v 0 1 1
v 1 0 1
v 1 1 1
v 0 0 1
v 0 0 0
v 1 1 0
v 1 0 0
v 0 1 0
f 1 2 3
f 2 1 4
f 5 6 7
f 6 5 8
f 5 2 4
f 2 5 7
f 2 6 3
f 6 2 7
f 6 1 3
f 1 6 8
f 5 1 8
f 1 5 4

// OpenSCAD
// file: ../config.scad
// Global configuration for the printable 28BYJ-48 Alt-Az mount.
// Units: millimetres, degrees.

$fn = $preview ? 48 : 96;
EPS = 0.02;

FIT = 0.25;
PRESS_FIT = 0.10;
ELEPHANT_FOOT = 0.25;
MIN_WALL = 2.4;

// 28BYJ-48 mechanical envelope. Clone dimensions vary: verify yours.
BYJ_BODY_D = 28.0;
BYJ_BODY_H = 19.0;
BYJ_FLANGE_T = 1.5;
BYJ_BOSS_D = 9.0;
BYJ_BOSS_H = 2.5;
BYJ_SHAFT_D = 5.0;
BYJ_SHAFT_FLAT = 3.0;
BYJ_SHAFT_L = 10.0;
BYJ_MOUNT_SPACING = 35.0;
BYJ_MOUNT_HOLE_D = 4.0;
BYJ_SHAFT_TO_HOLE_LINE = 8.0;
BYJ_BODY_CENTER_FROM_SHAFT = [0, -11.0];
BYJ_CABLE_BOX = [14.6, 8.0, 11.0];

// Additional reducer: 12 -> 48 and 12 -> 60 = 20:1.
GEAR_MODULE = 1.0;
GEAR_PRESSURE_ANGLE = 20;
GEAR_BACKLASH = 0.12;
GEAR_CLEARANCE = 0.25;
GEAR_Z1 = 12;
GEAR_Z2 = 48;
GEAR_Z3 = 12;
GEAR_Z4 = 60;
GEAR_FACE = 5.0;
GEAR_GAP = 1.0;
GEAR_STACK_H = GEAR_FACE * 2 + GEAR_GAP;
GEAR_RATIO = (GEAR_Z2 / GEAR_Z1) * (GEAR_Z4 / GEAR_Z3);
CD_STAGE1 = GEAR_MODULE * (GEAR_Z1 + GEAR_Z2) / 2;
CD_STAGE2 = GEAR_MODULE * (GEAR_Z3 + GEAR_Z4) / 2;

REDUCER_OUTPUT = [0, 0];
REDUCER_INTERMEDIATE = [CD_STAGE2, 0];
REDUCER_MOTOR = [CD_STAGE2, CD_STAGE1];
REDUCER_MOTOR_ROT = 130;
INTERMEDIATE_AXLE_D = 3.2;

BEARING_608_ID = 8.0;
BEARING_608_OD = 22.0;
BEARING_608_W = 7.0;
AXIS_SHAFT_D = 8.0;
AXIS_CLEARANCE_D = 8.3;
M3_CLEARANCE_D = 3.3;
M4_CLEARANCE_D = 4.4;
M5_CLEARANCE_D = 5.5;
M8_CLEARANCE_D = 8.6;

TRIPOD_THREAD_D = 6.35;
TRIPOD_CLEARANCE_D = 6.8;
TRIPOD_NUT_AF = 11.2;
TRIPOD_NUT_H = 5.8;

// Azimuth base, gearbox cover and turntable.
AZ_BASE_D = 132.0;
AZ_COVER_BOLT_R = 59.0;
AZ_BASE_PLATE_H = 3.0;
AZ_PEDESTAL_H = 24.0;
AZ_PEDESTAL_D = 48.0;
AZ_COVER_H = 16.0;
AZ_COVER_WALL = 3.0;
AZ_COVER_TOP_T = 3.0;
AZ_TURNTABLE_D = 120.0;
AZ_TURNTABLE_H = 9.0;
AZ_GLIDE_RADIUS = 43.0;
AZ_GLIDE_D = 8.0;
AZ_GLIDE_GAP = 1.0;
AZ_COVER_CLEARANCE = 0.8;
AZ_OUTPUT_SPACER_H = 5.0;
AZ_OUTPUT_PASSAGE_D = 32.0;
AZ_OUTPUT_LOCATOR_D = 30.0;
AZ_OUTPUT_LOCATOR_DEPTH = 2.0;
AZ_OUTPUT_BOLT_R = 11.5;
AZ_AXIS_NUT_RECESS_D = 17.0;
AZ_AXIS_NUT_RECESS_H = 4.0;
AZ_YOKE_MOUNT_X = 36.0;
AZ_YOKE_MOUNT_Y = 10.0;
AZ_YOKE_NUT_DEPTH = 3.5;

// Azimuth 20:1 printed reducer axial stack and interfaces.
AZ_GEAR_Z0 = 1.0;
AZ_UPPER_GEAR_Z = AZ_GEAR_Z0 + GEAR_FACE + GEAR_GAP;
AZ_GEAR_TOP_CLEARANCE = AZ_COVER_H - AZ_COVER_TOP_T - (AZ_UPPER_GEAR_Z + GEAR_FACE);
AZ_MOTOR_PINION_HUB_D = 10.8;
AZ_MOTOR_PINION_HUB_H = 7.0;
AZ_COMPOUND_HUB_D = 10.0;
AZ_INTERMEDIATE_BORE_D = 3.35;
AZ_OUTPUT_HUB_D = 29.6;
AZ_OUTPUT_HUB_H = AZ_COVER_H + AZ_GLIDE_GAP + AZ_OUTPUT_LOCATOR_DEPTH - AZ_UPPER_GEAR_Z;
AZ_OUTPUT_NUT_DEPTH = 2.8;

YOKE_AXIS_Z = 96.0;
YOKE_INNER_W = 92.0;
YOKE_ARM_T = 8.0;
YOKE_ARM_W = 34.0;
YOKE_OUTER_W = YOKE_INNER_W + 2 * YOKE_ARM_T;
YOKE_FOOT_LEN = 42.0;
YOKE_FOOT_W = 30.0;
YOKE_ARM_CENTER_X = YOKE_INNER_W / 2 + YOKE_ARM_T / 2;
YOKE_TENON_LEN = 28.0;
YOKE_BRIDGE_X = 112.0;
YOKE_BRIDGE_Y = 36.0;
YOKE_BRIDGE_H = 12.0;
YOKE_SLOT_DEPTH = 9.0;
YOKE_SLOT_CLEARANCE = 0.35;
YOKE_LOCK_LOCAL_Y = 3.0;
YOKE_BEARING_POCKET_DEPTH = 7.2;
YOKE_DRIVE_BOSS_D = 54.0;
YOKE_IDLER_BOSS_D = 44.0;
YOKE_GEARBOX_BOLT_R = 18.0;
ALT_GEARBOX_GAP = 14.0;
ALT_BACKPLATE_H = 3.2;
ALT_SHAFT_L = 165.0;

PAYLOAD_PLATE = [80.0, 112.0, 6.0];
PAYLOAD_SLOT_L = 48.0;
PAYLOAD_SLOT_D = TRIPOD_CLEARANCE_D;
SHAFT_CLAMP_W = 18.0;
SHAFT_CLAMP_L = 30.0;
SHAFT_CLAMP_H = 10.0;
PAYLOAD_CLAMP_HALF_H = 8.0;
PAYLOAD_CLAMP_X = 27.0;
PAYLOAD_CLAMP_BOLT_Y = 10.0;
PAYLOAD_PLATE_OFFSET_Z = 8.0;

// Altitude 20:1 drive, mounted outside yoke_arm_drive.
// Local gearbox coordinates are centered on the ALT shaft; +Z points outboard.
ALT_PLATE_T = 3.2;
ALT_OUTPUT_CENTER = [0, 0];
ALT_INTERMEDIATE = [CD_STAGE2, 0];
ALT_MOTOR = [CD_STAGE2, -CD_STAGE1];
ALT_MOTOR_ROT = 0;
ALT_GEAR_Z0 = ALT_PLATE_T + 1.0;
ALT_UPPER_GEAR_Z = ALT_GEAR_Z0 + GEAR_FACE + GEAR_GAP;
ALT_GUARD_H = 17.0;
ALT_GUARD_WALL = 2.4;
ALT_GUARD_TOP_T = 2.4;
ALT_GUARD_TOP_Z = ALT_PLATE_T + ALT_GUARD_H;
ALT_GEAR_TOP_CLEARANCE = ALT_GUARD_TOP_Z - ALT_GUARD_TOP_T - (ALT_UPPER_GEAR_Z + GEAR_FACE);
ALT_OUTLINE_R_OUTPUT = 36.0;
ALT_OUTLINE_R_INTERMEDIATE = 30.0;
ALT_OUTLINE_R_MOTOR = 25.0;
ALT_PLATE_OUTPUT_CLEAR_D = 24.0;
ALT_INTERMEDIATE_BORE_D = 3.35;
ALT_COMPOUND_HUB_D = 10.0;
ALT_MOTOR_PINION_HUB_D = 10.8;
ALT_OUTPUT_BORE_D = 8.20;
ALT_OUTPUT_HUB_D = 24.0;
ALT_OUTPUT_HUB_H = 15.0;
ALT_OUTPUT_SET_PILOT_D = 2.7;
ALT_OUTPUT_SET_Z = 11.2;
ALT_OUTPUT_SPACER_D = 12.0;
ALT_OUTPUT_SPACER_H = ALT_UPPER_GEAR_Z - 0.15;
ALT_GUARD_CENTER_CLEAR_D = 26.0;
ALT_GUARD_BOSS_H = 4.0;
ALT_GUARD_SCREW_POS = [[-30,-24],[-30,24],[62,22],[58,-44]];
ALT_GUARD_SCREW_BOSS_D = 10.0;
ALT_GUARD_NUT_DEPTH = 2.8;
ALT_YOKE_HEAD_RECESS_D = 6.4;
ALT_YOKE_HEAD_RECESS_H = 1.7;

// Removable tabletop adapter for flat-surface operation.
TABLETOP_BASE_D = 190.0;
TABLETOP_BASE_T = 8.0;
TABLETOP_LOCATOR_D = AZ_PEDESTAL_D + 1.0;
TABLETOP_LOCATOR_DEPTH = 1.5;
TABLETOP_CENTER_CLEAR_D = TRIPOD_CLEARANCE_D;
TABLETOP_BOLT_HEAD_D = 16.0;
TABLETOP_BOLT_HEAD_RECESS_H = 5.0;
TABLETOP_FOOT_R = 82.0;
TABLETOP_FOOT_D = 18.0;
TABLETOP_FOOT_RECESS_H = 1.2;

BYJ_NOMINAL_HALFSTEPS_PER_OUTPUT_REV = 4096;
AXIS_NOMINAL_STEPS_PER_REV = BYJ_NOMINAL_HALFSTEPS_PER_OUTPUT_REV * GEAR_RATIO;
// main file
// Fast analytic safety-margin checks for geometry whose clearance is invariant
// under ALT/AZ rotation. Dense boolean motion checks live in
// motion_collision_check.scad; these assertions complement them.

include <../config.scad>

QA_MARGIN = is_undef(QA_MARGIN) ? 0.5 : QA_MARGIN;

payload_side_gap = (YOKE_INNER_W - PAYLOAD_PLATE[0]) / 2;
clamp_outer_x = PAYLOAD_CLAMP_X + SHAFT_CLAMP_W / 2;
clamp_side_gap = YOKE_INNER_W / 2 - clamp_outer_x;

// Conservative radial reach of the rectangular payload plate around the ALT axis.
payload_plate_radial_reach = sqrt(
    pow(PAYLOAD_PLATE[1] / 2, 2) +
    pow(PAYLOAD_CLAMP_HALF_H + PAYLOAD_PLATE[2], 2));
bridge_top_below_axis = (YOKE_BRIDGE_H - YOKE_SLOT_DEPTH + YOKE_AXIS_Z) - YOKE_BRIDGE_H;
bridge_radial_gap = bridge_top_below_axis - payload_plate_radial_reach;

assert(payload_side_gap >= QA_MARGIN,
       str("Payload plate side gap ", payload_side_gap,
           " mm is below QA margin ", QA_MARGIN, " mm"));
assert(clamp_side_gap >= QA_MARGIN,
       str("Payload clamp side gap ", clamp_side_gap,
           " mm is below QA margin ", QA_MARGIN, " mm"));
assert(bridge_radial_gap >= QA_MARGIN,
       str("Conservative bridge radial gap ", bridge_radial_gap,
           " mm is below QA margin ", QA_MARGIN, " mm"));

echo(str("MOTION_QA payload_side_gap_mm=", payload_side_gap));
echo(str("MOTION_QA clamp_side_gap_mm=", clamp_side_gap));
echo(str("MOTION_QA bridge_radial_gap_mm=", bridge_radial_gap));

// Non-empty diagnostic output so command-line CSG export has a success artifact.
cube([1, 1, 1]);
